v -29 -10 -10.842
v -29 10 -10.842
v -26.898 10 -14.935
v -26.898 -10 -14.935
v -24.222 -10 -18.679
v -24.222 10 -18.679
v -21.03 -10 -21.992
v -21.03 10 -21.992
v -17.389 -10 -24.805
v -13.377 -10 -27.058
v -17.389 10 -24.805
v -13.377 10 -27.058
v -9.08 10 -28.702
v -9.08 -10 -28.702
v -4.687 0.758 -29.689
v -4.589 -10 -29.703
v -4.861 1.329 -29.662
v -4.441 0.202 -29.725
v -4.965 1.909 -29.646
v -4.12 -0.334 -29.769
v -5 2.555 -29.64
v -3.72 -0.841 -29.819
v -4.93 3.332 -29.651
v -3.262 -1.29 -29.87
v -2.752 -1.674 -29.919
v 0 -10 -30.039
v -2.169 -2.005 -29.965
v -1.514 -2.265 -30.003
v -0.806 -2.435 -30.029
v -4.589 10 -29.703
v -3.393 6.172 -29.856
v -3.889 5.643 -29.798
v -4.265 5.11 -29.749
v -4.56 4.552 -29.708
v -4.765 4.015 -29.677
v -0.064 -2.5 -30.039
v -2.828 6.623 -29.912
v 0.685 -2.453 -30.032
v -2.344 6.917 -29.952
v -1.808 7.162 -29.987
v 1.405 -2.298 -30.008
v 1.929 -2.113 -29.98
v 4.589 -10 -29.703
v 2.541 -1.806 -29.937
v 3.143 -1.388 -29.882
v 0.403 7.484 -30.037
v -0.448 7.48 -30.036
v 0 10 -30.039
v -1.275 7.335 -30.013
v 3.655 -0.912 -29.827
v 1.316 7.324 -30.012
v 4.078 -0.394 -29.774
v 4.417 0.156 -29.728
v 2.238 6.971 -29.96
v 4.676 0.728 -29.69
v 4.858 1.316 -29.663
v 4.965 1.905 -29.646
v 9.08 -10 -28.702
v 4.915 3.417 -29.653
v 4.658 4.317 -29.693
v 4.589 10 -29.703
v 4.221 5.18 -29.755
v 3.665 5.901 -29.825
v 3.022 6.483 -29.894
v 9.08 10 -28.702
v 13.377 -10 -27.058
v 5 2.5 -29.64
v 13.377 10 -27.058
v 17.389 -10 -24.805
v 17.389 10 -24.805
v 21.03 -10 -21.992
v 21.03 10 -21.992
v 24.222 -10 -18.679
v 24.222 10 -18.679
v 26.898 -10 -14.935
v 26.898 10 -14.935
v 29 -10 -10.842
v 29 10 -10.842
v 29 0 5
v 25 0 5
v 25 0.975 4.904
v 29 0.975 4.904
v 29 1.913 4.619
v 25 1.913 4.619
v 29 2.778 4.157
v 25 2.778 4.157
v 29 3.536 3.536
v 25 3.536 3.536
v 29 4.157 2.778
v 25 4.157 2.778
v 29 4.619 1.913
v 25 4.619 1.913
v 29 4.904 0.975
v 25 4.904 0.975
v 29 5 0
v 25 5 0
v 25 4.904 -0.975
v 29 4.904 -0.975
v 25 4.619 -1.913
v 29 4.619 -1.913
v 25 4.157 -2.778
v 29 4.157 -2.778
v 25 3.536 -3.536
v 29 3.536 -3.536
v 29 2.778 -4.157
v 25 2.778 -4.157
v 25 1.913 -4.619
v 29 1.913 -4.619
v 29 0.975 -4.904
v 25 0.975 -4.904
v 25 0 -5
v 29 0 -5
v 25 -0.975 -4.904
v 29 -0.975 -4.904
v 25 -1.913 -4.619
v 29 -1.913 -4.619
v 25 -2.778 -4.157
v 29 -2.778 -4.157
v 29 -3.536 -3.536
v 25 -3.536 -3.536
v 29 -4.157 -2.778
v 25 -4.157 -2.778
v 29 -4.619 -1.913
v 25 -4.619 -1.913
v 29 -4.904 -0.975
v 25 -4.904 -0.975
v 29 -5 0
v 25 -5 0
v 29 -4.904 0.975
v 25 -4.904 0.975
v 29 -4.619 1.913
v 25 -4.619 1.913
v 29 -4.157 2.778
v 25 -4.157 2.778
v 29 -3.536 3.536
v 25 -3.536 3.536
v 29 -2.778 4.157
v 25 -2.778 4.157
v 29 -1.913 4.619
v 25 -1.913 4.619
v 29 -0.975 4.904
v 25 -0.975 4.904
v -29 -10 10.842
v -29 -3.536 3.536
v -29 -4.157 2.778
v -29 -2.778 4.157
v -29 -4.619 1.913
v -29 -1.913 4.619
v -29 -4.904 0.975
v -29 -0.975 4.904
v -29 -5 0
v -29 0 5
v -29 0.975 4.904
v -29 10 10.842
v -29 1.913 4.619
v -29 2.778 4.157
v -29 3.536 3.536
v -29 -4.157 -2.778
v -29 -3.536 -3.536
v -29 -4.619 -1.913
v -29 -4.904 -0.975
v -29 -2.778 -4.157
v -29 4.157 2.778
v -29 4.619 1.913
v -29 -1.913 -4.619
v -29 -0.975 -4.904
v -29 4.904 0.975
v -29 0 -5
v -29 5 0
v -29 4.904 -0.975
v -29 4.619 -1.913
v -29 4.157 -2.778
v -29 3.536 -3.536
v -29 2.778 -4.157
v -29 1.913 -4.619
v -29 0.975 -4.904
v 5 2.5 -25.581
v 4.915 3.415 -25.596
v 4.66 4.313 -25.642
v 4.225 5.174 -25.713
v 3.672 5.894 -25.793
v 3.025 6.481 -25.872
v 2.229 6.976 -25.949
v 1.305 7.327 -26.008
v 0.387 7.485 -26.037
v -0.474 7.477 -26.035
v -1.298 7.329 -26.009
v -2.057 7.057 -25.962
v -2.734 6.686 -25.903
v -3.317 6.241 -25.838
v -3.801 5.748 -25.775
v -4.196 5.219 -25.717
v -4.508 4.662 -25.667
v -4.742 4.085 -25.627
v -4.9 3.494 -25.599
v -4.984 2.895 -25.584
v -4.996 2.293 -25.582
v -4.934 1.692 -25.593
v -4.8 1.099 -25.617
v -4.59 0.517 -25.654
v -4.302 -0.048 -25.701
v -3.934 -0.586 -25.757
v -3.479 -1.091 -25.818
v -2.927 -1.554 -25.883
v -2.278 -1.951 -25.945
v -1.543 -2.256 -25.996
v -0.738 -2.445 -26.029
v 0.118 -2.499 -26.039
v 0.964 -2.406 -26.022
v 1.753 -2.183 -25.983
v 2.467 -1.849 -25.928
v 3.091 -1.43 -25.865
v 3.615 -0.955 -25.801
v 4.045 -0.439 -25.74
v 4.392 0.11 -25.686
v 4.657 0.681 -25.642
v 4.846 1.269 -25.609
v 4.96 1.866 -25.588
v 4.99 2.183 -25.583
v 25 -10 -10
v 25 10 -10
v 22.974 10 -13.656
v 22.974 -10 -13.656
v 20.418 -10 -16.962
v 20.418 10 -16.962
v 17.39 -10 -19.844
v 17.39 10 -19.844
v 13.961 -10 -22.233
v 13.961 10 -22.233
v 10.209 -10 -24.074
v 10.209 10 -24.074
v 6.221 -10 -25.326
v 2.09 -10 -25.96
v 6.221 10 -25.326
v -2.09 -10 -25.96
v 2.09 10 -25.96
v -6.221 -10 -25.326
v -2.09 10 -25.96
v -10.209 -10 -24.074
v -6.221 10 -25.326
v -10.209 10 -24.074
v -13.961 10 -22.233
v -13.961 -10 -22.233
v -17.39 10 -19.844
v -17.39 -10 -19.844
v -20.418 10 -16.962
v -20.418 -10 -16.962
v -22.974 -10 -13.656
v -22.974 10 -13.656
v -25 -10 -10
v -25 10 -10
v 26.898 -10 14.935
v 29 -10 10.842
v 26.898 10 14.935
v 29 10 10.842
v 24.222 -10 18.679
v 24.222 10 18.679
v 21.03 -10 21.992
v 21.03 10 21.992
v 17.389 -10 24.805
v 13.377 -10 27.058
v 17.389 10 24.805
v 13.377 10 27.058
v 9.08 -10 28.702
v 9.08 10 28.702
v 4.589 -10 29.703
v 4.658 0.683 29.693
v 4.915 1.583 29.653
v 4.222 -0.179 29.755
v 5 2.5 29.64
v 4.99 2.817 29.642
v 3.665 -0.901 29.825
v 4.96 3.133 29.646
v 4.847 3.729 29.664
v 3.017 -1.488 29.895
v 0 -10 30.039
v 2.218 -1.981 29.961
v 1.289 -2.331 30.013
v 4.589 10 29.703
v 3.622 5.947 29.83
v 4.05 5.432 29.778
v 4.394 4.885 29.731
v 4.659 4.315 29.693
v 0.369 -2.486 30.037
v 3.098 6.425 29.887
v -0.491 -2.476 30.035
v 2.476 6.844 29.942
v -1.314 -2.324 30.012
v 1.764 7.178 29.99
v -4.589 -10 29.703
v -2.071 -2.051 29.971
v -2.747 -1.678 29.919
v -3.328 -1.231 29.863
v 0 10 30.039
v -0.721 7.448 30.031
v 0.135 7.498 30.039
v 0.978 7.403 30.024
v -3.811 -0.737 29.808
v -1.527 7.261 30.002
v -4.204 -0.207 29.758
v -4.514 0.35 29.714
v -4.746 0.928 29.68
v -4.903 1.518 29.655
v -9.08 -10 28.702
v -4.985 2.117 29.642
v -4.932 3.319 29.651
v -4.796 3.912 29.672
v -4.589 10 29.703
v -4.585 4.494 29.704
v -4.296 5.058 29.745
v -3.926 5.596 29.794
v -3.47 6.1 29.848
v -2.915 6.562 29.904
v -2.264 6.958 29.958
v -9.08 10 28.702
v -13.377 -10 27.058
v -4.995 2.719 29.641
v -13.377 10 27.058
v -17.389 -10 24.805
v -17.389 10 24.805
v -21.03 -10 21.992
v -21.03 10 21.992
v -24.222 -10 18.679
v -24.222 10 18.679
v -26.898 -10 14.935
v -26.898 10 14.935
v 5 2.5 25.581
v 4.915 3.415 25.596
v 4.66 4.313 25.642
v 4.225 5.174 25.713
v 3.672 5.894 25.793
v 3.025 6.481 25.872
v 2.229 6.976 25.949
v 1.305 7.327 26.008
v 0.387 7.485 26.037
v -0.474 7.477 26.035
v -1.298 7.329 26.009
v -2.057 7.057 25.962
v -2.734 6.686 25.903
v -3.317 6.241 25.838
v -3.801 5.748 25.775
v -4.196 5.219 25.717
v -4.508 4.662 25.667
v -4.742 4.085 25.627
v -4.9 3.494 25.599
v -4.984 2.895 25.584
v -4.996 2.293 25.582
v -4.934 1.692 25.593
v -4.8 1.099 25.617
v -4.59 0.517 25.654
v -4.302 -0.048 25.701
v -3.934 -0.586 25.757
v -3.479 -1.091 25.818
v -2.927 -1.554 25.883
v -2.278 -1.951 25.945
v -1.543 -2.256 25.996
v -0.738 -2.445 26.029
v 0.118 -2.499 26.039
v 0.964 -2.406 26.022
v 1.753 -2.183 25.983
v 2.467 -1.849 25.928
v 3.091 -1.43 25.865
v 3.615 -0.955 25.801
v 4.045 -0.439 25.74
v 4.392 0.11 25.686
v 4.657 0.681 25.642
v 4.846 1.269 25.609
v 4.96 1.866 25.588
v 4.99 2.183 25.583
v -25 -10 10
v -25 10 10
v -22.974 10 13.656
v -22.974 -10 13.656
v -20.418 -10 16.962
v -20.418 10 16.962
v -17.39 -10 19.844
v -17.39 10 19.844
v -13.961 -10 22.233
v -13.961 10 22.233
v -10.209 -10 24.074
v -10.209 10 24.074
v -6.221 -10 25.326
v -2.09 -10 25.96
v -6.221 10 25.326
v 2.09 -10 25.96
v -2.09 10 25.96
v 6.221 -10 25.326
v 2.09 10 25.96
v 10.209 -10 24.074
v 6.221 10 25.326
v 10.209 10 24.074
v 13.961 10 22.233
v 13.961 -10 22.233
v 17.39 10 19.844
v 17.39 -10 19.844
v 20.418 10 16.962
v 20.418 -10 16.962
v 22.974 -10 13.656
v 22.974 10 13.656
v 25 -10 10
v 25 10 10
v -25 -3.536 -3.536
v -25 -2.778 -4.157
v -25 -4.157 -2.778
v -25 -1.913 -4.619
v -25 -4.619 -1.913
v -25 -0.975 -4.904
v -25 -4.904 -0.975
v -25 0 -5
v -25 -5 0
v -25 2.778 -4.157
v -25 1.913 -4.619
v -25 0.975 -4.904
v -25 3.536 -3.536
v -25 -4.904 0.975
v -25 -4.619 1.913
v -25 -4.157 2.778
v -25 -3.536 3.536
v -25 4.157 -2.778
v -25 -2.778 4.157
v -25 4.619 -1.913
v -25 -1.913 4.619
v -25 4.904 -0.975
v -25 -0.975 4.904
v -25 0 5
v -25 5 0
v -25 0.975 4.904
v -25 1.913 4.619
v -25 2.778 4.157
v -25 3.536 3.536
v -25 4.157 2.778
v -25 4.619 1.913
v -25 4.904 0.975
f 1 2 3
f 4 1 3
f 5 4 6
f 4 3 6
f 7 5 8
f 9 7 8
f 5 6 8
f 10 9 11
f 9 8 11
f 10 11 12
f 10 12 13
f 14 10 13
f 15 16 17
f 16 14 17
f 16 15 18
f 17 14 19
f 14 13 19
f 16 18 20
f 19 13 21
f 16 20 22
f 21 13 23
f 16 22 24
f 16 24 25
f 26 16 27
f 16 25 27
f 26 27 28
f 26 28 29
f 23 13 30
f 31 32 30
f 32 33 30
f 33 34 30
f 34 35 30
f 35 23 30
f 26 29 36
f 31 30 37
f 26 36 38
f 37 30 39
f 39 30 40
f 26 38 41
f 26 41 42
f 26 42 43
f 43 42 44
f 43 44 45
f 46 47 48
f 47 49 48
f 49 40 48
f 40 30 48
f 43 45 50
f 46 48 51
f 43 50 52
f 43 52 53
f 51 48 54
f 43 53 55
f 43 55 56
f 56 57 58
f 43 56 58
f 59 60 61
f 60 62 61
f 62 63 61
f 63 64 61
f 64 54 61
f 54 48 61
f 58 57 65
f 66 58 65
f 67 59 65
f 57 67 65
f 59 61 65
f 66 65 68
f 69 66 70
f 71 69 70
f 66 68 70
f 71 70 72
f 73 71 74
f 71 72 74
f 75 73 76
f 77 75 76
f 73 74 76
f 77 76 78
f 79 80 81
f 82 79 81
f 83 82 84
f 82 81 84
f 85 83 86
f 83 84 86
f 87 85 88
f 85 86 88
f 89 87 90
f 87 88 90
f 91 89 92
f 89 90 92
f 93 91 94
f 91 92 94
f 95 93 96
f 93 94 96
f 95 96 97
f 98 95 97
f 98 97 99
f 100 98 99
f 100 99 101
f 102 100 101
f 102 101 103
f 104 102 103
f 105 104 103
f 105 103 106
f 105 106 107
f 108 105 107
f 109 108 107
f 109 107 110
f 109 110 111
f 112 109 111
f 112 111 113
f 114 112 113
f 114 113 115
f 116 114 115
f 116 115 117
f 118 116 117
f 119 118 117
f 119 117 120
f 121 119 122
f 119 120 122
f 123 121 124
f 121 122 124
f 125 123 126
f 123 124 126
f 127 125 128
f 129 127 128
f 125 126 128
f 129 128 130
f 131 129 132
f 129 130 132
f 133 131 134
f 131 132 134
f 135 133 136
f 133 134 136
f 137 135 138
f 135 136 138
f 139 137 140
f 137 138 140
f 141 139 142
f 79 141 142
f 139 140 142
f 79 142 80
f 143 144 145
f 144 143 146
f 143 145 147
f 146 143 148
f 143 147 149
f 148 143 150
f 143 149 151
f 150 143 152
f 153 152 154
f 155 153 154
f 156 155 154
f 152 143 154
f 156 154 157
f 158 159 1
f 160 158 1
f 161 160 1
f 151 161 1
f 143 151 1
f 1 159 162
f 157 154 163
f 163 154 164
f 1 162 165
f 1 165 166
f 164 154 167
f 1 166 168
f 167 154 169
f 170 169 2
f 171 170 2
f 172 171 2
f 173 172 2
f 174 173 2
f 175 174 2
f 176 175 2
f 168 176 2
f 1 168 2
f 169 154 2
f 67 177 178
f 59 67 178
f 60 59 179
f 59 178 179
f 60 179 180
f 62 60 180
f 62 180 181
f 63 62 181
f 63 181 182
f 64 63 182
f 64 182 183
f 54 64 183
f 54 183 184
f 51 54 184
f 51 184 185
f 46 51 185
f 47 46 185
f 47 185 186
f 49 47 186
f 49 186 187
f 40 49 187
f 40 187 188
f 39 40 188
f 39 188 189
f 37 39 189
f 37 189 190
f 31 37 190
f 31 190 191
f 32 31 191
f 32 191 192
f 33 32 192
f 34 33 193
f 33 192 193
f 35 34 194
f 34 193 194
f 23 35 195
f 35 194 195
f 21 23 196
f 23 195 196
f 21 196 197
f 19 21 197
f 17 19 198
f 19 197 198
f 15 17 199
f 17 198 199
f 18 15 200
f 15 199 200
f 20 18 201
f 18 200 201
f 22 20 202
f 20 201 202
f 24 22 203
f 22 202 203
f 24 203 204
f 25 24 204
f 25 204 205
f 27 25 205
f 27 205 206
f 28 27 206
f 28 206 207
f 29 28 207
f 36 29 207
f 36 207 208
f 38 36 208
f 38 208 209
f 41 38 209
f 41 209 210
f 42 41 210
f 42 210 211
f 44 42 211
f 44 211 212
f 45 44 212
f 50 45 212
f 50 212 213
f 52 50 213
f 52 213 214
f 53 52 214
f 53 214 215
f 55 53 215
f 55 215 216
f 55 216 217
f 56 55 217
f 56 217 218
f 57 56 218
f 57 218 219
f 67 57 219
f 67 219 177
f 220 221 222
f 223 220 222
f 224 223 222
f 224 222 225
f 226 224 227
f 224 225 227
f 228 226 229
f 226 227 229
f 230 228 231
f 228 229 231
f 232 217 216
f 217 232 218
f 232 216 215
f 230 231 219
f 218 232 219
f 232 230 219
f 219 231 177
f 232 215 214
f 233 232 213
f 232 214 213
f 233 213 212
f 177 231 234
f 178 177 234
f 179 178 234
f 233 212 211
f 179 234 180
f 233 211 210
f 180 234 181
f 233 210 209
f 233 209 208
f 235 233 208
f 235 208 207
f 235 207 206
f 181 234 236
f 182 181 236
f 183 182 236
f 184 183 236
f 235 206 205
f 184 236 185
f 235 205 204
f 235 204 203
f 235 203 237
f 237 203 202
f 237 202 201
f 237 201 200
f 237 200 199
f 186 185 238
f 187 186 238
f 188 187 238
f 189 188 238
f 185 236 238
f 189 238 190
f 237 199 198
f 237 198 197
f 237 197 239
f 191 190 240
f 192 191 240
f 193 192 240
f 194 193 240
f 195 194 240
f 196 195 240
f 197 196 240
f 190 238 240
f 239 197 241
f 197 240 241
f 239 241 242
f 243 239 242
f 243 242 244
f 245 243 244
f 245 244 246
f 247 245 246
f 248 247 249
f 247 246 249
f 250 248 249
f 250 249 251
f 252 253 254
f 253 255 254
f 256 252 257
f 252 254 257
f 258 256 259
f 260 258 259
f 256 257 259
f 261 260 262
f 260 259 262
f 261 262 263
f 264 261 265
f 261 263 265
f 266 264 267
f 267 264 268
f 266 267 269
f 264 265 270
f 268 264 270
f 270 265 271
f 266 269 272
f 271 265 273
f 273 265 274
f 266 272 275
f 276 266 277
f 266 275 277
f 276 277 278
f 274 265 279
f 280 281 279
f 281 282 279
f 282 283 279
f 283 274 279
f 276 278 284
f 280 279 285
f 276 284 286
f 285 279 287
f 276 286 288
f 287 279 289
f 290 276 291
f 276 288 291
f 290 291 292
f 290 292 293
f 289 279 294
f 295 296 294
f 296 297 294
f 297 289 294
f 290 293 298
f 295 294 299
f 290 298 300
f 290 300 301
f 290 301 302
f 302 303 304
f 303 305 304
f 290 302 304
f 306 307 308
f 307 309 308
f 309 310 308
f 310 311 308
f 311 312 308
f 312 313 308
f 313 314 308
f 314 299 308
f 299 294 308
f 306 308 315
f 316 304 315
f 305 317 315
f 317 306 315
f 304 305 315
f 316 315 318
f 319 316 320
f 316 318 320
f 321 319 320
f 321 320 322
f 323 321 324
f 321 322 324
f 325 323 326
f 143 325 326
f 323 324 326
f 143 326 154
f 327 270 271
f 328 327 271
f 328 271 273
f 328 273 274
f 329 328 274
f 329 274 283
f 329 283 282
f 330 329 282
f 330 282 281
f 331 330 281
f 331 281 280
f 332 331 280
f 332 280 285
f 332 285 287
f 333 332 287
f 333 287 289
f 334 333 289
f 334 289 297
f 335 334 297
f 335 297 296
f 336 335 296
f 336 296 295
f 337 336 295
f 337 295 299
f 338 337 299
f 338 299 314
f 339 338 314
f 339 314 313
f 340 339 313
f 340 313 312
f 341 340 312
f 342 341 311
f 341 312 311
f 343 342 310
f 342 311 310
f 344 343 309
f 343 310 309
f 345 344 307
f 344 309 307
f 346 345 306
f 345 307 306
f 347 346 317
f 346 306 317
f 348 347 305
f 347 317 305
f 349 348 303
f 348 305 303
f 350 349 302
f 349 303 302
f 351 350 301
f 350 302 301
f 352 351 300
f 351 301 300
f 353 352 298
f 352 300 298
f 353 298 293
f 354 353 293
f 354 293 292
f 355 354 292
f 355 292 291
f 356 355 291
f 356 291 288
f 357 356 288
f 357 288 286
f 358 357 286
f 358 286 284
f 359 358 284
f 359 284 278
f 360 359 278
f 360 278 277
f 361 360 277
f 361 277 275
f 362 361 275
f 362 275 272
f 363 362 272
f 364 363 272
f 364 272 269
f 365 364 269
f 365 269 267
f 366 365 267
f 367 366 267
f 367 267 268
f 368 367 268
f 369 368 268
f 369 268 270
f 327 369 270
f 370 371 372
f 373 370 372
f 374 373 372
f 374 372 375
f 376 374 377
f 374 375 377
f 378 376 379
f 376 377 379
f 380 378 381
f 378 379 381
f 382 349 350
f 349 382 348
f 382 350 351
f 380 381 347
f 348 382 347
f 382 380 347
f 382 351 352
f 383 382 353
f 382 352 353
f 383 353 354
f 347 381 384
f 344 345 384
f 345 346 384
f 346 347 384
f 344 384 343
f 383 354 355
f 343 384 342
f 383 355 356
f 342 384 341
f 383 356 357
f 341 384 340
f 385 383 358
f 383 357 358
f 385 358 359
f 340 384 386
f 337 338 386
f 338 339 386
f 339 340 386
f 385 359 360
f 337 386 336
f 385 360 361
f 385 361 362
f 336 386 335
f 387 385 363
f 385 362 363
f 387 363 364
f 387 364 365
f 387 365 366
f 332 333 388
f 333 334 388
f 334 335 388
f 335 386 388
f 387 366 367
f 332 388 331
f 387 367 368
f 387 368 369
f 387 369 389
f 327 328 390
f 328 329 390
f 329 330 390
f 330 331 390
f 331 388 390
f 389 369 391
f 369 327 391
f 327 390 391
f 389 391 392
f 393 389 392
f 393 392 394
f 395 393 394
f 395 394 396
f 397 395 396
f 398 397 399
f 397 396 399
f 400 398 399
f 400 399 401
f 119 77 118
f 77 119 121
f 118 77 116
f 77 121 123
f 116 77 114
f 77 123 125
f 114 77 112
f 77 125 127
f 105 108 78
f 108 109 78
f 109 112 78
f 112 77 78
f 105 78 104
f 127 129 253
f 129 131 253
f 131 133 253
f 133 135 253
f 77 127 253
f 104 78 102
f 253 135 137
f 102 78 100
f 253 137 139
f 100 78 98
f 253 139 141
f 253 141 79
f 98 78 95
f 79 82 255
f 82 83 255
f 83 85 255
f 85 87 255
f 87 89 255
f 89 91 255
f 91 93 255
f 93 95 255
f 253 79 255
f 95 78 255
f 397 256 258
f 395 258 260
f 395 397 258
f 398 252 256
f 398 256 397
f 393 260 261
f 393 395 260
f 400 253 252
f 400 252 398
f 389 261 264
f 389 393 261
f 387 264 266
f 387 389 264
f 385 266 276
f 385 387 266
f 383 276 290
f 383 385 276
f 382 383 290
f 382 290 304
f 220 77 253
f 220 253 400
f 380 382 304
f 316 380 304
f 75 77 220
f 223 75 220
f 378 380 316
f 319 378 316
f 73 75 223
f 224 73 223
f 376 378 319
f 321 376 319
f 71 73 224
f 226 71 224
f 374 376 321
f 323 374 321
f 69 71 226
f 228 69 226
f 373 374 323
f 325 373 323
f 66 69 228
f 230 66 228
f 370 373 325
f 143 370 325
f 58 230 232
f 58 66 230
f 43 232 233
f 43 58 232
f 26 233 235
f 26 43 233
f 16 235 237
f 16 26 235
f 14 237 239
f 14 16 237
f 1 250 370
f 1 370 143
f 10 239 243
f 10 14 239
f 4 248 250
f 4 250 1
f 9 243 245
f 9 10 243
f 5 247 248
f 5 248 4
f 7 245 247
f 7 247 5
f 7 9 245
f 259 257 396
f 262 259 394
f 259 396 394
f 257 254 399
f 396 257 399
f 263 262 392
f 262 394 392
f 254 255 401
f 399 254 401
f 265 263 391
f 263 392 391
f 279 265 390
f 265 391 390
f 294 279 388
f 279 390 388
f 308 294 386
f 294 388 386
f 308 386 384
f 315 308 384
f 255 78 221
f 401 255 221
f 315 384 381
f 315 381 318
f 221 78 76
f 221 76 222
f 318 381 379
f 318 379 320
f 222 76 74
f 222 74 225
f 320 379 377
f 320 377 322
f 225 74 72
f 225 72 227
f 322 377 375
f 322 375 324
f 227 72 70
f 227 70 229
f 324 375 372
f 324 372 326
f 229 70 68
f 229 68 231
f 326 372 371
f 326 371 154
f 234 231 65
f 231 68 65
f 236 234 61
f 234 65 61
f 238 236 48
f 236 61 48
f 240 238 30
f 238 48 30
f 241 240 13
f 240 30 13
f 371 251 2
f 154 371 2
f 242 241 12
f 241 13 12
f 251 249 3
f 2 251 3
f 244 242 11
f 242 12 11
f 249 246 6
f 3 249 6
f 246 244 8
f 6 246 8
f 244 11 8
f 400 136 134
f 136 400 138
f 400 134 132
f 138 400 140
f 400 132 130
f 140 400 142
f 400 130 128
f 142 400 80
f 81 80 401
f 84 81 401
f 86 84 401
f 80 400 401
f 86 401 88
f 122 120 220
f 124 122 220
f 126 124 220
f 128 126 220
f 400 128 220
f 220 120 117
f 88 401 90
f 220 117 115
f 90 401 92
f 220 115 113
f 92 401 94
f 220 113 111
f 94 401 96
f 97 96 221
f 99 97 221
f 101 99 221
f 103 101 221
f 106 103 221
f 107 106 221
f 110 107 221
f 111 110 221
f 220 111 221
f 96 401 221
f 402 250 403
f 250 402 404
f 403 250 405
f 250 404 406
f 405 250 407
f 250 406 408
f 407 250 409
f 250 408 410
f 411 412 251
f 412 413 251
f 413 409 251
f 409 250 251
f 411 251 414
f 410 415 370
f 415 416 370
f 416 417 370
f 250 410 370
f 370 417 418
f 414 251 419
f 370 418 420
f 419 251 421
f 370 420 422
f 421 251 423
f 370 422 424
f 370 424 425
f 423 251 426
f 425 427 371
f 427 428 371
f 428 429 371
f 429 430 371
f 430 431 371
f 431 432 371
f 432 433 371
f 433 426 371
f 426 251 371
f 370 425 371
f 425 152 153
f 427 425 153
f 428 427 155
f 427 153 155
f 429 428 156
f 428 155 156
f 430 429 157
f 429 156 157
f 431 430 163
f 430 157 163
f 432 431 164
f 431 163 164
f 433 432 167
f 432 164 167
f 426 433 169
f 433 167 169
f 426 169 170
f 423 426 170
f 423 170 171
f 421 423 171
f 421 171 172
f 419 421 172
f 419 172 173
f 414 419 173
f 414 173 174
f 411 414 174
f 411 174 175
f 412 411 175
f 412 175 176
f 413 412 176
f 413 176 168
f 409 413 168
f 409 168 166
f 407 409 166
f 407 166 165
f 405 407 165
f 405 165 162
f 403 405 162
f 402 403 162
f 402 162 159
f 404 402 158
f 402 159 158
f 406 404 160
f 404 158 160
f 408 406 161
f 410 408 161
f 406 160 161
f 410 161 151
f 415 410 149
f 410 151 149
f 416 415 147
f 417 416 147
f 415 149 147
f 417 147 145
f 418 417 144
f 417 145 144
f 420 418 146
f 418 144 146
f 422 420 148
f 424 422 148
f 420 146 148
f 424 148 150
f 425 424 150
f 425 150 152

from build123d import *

# Parameters (mm, degrees)
BOSS_EXTRUDE1_DEPTH     = 10
CUT_EXTRUDE1_REACH      = 68.078
SKETCH2_R               = 5
CUT_EXTRUDE2_REACH      = 69.457
CUT_EXTRUDE2_END_RADIUS = 31.503056099
SKETCH3_R               = 5


with BuildPart() as part:
    # Sketch1 → Boss-Extrude1 (new, symmetric)
    with BuildSketch(Plane(origin=(0, 0, 0), x_dir=(1, 0, 0), z_dir=(0, 1, 0))):
        with BuildLine():
            Line((29, 10.842426248), (29, -10.842426248))
            ThreePointArc((29, -10.842426248), (0, -30.039282951), (-29, -10.842426248))
            Line((-29, -10.842426248), (-29, 10.842426248))
            ThreePointArc((-29, 10.842426248), (0, 30.039282951), (29, 10.842426248))
        make_face()
        with BuildLine():
            Line((-25, 10), (-25, -10))
            ThreePointArc((-25, -10), (0, -26.039282951), (25, -10))
            Line((25, -10), (25, 10))
            ThreePointArc((25, 10), (0, 26.039282951), (-25, 10))
        make_face(mode=Mode.SUBTRACT)
    extrude(amount=BOSS_EXTRUDE1_DEPTH, both=True)

    # Cut-Extrude1: up to this face of the body (flat: up to its plane)
    cut_extrude1_end = Plane(part.part.faces().sort_by_distance((29, 0, 0))[0])
    # Sketch2 → Cut-Extrude1 (cut, up to the picked face)
    with BuildSketch(Plane.ZY.offset(29), mode=Mode.PRIVATE) as cut_extrude1_sk1:
        Circle(SKETCH2_R)
    cut_extrude1_tool1 = split(extrude(cut_extrude1_sk1.sketch, amount=-CUT_EXTRUDE1_REACH, mode=Mode.PRIVATE), bisect_by=cut_extrude1_end, keep=Keep.BOTH, mode=Mode.PRIVATE)
    add(cut_extrude1_tool1.solids().sort_by(Axis((-29, 0, 0), (1, 0, 0)))[0], mode=Mode.SUBTRACT)

    # Cut-Extrude2: up to this cylinder (the profile starts inside it)
    cut_extrude2_end = Plane(origin=(0, 2.5, 1.463773147), z_dir=(0, -1, 0)) * Cylinder(CUT_EXTRUDE2_END_RADIUS, 202.920112198, mode=Mode.PRIVATE)
    # Sketch3 → Cut-Extrude2 (cut, up to the surface)
    with BuildSketch(Plane.XY.offset(30.039282951), mode=Mode.PRIVATE) as cut_extrude2_sk1:
        with Locations((0, 2.5)):
            Circle(SKETCH3_R)
    cut_extrude2_tool1 = extrude(cut_extrude2_sk1.sketch, amount=-CUT_EXTRUDE2_REACH, mode=Mode.PRIVATE) & cut_extrude2_end
    add(cut_extrude2_tool1.solids().sort_by_distance((0, 2.5, 30.039283))[0], mode=Mode.SUBTRACT)


solid = part.part
